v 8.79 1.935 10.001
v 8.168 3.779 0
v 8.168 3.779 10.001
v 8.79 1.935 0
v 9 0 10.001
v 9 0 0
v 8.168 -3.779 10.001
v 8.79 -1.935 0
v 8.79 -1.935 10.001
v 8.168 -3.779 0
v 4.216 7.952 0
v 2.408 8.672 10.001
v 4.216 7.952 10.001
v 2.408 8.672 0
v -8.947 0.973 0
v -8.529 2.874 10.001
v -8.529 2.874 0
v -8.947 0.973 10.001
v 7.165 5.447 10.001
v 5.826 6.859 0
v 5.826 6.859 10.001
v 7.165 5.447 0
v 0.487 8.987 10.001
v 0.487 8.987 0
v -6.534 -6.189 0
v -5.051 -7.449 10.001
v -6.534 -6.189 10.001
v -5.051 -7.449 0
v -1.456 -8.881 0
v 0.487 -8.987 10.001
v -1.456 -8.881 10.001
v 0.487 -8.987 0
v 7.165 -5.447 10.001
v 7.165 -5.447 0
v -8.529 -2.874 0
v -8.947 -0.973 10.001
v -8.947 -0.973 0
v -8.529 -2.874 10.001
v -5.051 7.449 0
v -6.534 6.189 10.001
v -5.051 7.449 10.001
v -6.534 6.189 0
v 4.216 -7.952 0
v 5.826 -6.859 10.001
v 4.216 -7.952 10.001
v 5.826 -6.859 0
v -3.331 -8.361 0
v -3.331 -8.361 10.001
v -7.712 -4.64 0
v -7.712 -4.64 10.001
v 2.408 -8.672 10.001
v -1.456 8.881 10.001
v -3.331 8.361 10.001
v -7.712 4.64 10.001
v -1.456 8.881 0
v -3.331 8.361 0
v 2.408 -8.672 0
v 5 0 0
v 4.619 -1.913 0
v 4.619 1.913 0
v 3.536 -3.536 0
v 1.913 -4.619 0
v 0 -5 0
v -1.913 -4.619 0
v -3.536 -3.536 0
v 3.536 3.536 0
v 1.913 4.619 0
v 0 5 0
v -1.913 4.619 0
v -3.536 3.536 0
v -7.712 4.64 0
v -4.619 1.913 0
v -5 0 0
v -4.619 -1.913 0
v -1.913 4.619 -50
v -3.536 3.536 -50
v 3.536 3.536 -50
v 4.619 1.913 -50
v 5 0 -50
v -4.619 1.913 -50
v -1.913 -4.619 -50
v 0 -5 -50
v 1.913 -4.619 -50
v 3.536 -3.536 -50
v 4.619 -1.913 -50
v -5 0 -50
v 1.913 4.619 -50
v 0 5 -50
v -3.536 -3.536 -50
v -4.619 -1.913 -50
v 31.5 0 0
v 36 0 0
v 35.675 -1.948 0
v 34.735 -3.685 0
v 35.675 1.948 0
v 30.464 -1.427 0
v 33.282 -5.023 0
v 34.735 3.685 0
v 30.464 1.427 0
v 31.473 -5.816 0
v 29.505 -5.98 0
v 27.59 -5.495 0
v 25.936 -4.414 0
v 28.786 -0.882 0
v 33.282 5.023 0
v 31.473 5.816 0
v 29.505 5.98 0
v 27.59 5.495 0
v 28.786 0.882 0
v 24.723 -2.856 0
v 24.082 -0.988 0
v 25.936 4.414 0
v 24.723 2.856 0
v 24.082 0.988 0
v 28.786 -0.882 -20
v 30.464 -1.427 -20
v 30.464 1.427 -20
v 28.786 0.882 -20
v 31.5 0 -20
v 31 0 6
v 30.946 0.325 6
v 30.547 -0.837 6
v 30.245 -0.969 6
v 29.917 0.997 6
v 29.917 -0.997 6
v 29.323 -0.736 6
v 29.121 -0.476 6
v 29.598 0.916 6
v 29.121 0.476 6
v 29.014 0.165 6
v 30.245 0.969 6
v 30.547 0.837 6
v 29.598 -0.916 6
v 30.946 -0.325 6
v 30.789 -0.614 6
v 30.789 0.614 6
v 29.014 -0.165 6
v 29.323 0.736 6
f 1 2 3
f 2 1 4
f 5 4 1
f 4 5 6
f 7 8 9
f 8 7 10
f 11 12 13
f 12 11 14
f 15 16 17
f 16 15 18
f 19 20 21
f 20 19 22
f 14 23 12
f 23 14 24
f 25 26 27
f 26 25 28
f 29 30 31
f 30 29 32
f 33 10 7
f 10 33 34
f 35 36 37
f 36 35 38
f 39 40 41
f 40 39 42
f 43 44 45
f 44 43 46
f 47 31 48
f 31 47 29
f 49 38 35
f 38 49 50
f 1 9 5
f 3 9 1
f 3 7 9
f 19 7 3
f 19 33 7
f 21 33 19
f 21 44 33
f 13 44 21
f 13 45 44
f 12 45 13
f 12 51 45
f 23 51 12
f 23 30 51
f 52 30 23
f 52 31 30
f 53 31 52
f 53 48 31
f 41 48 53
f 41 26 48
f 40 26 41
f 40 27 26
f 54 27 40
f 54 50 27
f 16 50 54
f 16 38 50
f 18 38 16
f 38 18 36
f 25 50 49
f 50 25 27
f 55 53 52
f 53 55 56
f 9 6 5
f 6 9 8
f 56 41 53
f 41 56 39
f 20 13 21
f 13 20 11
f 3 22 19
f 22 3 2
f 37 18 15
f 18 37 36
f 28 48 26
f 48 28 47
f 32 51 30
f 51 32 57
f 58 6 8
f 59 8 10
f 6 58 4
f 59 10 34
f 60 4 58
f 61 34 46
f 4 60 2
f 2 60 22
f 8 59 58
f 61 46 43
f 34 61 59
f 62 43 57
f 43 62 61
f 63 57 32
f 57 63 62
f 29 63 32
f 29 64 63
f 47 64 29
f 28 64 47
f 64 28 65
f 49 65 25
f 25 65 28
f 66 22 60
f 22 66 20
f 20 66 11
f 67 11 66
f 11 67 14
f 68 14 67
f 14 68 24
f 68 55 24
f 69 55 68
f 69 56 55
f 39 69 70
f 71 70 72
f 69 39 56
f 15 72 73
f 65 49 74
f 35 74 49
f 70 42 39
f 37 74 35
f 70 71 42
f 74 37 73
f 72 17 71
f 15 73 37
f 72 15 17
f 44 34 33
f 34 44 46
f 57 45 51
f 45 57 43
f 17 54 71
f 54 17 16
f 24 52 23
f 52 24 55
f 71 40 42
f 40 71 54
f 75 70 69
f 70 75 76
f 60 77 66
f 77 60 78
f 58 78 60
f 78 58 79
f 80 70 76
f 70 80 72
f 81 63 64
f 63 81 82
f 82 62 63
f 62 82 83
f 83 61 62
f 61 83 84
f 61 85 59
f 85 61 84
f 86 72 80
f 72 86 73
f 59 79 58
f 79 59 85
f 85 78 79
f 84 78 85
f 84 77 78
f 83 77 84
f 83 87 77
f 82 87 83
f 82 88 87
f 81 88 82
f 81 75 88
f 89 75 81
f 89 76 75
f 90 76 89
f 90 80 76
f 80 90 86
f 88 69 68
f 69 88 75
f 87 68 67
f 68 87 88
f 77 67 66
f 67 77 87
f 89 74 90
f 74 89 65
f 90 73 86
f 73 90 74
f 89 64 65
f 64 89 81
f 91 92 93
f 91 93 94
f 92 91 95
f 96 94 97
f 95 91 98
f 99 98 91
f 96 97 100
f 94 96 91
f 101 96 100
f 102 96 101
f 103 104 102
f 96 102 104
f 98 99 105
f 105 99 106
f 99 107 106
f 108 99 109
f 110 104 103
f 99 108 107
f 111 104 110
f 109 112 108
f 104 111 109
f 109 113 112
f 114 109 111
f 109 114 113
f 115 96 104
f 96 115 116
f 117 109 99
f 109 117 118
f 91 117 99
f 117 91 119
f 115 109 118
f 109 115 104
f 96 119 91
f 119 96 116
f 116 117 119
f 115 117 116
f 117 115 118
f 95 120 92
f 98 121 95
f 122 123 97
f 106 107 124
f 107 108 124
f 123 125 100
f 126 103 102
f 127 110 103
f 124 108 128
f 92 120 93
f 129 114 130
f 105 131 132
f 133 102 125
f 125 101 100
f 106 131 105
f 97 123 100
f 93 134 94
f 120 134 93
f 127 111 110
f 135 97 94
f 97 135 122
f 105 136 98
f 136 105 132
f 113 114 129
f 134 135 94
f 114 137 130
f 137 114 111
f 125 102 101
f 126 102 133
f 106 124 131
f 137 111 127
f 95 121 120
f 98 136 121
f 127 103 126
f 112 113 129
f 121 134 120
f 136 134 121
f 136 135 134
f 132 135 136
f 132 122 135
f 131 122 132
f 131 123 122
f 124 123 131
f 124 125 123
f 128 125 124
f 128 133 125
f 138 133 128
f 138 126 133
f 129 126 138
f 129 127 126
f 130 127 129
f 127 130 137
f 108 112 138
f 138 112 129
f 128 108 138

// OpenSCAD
SMALL_NUMBER = 0.001;

module HexScrew(length, m = 3) {
    color("grey") {
        cylinder(m+0.001, m*.9, m*.9, center = false);
        translate([0, 0, -length]) cylinder(length+.01, d1 = m, d2 = m, center = false);
    }
}

module HexScrewHeadClearance(m = 3) {
    cylinder(m * 2, m*2, 1, center = false);
}

module HexScrewConnection(m = 3, length = 20, cut = 10.001) {
    cylinder(cut, m*.9, m+(cut/5), center = false);
    HexScrew(length, m);
}

module SquareOf(size, rotate = 0) {
    offset = size / 2;

    rotate(rotate) translate([offset, offset]) rotate(-rotate) children(0);
    rotate(90 + rotate) translate([offset, offset]) rotate(-rotate) children(0);
    rotate(180 + rotate) translate([offset, offset]) rotate(-rotate) children(0);
    rotate(270 + rotate) translate([offset, offset]) rotate(-rotate) children(0);
}

module PaddedCube(size = [1, 1, 1], pad = 0, center = false) {
    new_size = [size[0] + pad, size[1] + pad, size[2] + pad];
    if (center)
        cube(new_size, center = true);
    else
        translate([-pad/2, -pad/2, -pad/2])
            cube(new_size, center = false);
}

HexScrew(50, m = 10);

translate([30, 0, 0]) {
    color("red") HexScrew(20, m = 3);
    color("blue") HexScrewHeadClearance(3);
}
